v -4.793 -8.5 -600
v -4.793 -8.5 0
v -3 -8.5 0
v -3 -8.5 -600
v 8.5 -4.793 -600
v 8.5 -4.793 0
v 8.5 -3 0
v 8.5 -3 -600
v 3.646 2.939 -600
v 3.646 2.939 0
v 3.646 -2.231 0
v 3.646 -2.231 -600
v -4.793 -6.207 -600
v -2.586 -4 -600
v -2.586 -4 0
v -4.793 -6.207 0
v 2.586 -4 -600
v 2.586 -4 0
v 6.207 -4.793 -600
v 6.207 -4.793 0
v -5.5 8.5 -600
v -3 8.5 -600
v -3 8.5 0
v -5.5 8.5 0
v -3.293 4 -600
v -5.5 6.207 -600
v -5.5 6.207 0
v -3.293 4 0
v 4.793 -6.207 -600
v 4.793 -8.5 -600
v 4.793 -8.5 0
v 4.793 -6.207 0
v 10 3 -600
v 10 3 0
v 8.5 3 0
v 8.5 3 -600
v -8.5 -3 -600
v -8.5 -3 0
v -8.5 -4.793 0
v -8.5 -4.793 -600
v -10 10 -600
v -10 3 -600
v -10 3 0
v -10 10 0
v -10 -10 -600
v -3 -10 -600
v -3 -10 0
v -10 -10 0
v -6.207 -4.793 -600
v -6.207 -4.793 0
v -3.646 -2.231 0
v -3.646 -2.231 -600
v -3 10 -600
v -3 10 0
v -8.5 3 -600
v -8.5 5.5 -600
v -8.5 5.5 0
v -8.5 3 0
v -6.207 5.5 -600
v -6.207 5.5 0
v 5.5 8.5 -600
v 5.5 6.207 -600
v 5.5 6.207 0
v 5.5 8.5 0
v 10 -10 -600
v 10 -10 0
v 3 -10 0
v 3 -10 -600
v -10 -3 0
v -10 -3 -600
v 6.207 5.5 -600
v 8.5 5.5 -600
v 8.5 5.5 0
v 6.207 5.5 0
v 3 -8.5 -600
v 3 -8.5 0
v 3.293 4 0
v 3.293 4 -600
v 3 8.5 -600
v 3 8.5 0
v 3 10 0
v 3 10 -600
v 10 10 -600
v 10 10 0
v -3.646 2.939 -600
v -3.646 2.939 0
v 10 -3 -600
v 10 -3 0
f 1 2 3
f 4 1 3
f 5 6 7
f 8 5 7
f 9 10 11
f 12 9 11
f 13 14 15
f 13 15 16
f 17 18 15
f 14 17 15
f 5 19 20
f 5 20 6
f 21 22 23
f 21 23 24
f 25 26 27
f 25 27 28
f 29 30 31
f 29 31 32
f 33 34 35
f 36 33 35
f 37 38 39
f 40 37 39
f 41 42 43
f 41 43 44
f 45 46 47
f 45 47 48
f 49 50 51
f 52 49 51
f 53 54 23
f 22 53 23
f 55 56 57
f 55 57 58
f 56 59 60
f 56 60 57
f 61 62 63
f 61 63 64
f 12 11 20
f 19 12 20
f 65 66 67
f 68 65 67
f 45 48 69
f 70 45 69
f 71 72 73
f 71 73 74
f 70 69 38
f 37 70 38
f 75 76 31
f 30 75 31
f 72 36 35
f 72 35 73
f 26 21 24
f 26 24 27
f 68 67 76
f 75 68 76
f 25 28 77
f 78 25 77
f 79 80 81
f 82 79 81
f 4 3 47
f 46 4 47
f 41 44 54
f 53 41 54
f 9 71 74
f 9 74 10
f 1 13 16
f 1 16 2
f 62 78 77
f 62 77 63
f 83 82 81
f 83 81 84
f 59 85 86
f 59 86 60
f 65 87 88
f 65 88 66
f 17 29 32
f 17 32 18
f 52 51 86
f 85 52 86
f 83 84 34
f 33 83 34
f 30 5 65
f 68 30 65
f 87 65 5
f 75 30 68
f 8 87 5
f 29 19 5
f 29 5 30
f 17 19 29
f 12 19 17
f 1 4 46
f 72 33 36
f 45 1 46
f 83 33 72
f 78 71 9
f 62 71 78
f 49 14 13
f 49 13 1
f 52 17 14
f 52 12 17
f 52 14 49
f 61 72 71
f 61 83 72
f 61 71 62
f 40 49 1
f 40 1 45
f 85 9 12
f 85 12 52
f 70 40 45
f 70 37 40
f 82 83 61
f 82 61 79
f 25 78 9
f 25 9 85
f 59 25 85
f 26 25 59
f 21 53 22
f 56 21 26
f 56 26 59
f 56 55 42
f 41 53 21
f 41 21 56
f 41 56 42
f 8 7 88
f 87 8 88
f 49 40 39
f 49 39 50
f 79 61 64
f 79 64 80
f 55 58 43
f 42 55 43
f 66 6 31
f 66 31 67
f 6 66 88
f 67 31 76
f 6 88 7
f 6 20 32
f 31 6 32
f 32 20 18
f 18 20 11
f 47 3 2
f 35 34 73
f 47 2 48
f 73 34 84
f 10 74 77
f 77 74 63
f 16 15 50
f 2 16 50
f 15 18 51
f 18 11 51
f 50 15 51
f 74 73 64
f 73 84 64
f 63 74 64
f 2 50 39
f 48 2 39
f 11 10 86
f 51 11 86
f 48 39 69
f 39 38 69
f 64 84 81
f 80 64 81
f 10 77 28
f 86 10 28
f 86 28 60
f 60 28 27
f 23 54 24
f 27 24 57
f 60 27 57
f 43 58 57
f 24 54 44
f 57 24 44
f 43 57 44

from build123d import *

# Parameters (mm, degrees)
BOSS_EXTRUDE1_DEPTH = 600


with BuildPart() as part:
    # Sketch1 → Boss-Extrude1 (new body)
    with BuildSketch(Plane.XY):
        Polygon((-10, 3), (-10, 10), (-3, 10), (-3, 8.5), (-5.5, 8.5), (-5.5, 6.207106781), (-3.292893219, 4), (3.292893219, 4), (5.5, 6.207106781), (5.5, 8.5), (3, 8.5), (3, 10), (10, 10), (10, 3), (8.5, 3), (8.5, 5.5), (6.207106781, 5.5), (3.645660172, 2.938553391), (3.645660172, -2.231446609), (6.207106781, -4.792893219), (8.5, -4.792893219), (8.5, -3), (10, -3), (10, -10), (3, -10), (3, -8.5), (4.792893219, -8.5), (4.792893219, -6.207106781), (2.585786438, -4), (-2.585786438, -4), (-4.792893219, -6.207106781), (-4.792893219, -8.5), (-3, -8.5), (-3, -10), (-10, -10), (-10, -3), (-8.5, -3), (-8.5, -4.792893219), (-6.207106781, -4.792893219), (-3.645660172, -2.231446609), (-3.645660172, 2.938553391), (-6.207106781, 5.5), (-8.5, 5.5), (-8.5, 3), align=None)
    extrude(amount=-BOSS_EXTRUDE1_DEPTH)


solid = part.part
